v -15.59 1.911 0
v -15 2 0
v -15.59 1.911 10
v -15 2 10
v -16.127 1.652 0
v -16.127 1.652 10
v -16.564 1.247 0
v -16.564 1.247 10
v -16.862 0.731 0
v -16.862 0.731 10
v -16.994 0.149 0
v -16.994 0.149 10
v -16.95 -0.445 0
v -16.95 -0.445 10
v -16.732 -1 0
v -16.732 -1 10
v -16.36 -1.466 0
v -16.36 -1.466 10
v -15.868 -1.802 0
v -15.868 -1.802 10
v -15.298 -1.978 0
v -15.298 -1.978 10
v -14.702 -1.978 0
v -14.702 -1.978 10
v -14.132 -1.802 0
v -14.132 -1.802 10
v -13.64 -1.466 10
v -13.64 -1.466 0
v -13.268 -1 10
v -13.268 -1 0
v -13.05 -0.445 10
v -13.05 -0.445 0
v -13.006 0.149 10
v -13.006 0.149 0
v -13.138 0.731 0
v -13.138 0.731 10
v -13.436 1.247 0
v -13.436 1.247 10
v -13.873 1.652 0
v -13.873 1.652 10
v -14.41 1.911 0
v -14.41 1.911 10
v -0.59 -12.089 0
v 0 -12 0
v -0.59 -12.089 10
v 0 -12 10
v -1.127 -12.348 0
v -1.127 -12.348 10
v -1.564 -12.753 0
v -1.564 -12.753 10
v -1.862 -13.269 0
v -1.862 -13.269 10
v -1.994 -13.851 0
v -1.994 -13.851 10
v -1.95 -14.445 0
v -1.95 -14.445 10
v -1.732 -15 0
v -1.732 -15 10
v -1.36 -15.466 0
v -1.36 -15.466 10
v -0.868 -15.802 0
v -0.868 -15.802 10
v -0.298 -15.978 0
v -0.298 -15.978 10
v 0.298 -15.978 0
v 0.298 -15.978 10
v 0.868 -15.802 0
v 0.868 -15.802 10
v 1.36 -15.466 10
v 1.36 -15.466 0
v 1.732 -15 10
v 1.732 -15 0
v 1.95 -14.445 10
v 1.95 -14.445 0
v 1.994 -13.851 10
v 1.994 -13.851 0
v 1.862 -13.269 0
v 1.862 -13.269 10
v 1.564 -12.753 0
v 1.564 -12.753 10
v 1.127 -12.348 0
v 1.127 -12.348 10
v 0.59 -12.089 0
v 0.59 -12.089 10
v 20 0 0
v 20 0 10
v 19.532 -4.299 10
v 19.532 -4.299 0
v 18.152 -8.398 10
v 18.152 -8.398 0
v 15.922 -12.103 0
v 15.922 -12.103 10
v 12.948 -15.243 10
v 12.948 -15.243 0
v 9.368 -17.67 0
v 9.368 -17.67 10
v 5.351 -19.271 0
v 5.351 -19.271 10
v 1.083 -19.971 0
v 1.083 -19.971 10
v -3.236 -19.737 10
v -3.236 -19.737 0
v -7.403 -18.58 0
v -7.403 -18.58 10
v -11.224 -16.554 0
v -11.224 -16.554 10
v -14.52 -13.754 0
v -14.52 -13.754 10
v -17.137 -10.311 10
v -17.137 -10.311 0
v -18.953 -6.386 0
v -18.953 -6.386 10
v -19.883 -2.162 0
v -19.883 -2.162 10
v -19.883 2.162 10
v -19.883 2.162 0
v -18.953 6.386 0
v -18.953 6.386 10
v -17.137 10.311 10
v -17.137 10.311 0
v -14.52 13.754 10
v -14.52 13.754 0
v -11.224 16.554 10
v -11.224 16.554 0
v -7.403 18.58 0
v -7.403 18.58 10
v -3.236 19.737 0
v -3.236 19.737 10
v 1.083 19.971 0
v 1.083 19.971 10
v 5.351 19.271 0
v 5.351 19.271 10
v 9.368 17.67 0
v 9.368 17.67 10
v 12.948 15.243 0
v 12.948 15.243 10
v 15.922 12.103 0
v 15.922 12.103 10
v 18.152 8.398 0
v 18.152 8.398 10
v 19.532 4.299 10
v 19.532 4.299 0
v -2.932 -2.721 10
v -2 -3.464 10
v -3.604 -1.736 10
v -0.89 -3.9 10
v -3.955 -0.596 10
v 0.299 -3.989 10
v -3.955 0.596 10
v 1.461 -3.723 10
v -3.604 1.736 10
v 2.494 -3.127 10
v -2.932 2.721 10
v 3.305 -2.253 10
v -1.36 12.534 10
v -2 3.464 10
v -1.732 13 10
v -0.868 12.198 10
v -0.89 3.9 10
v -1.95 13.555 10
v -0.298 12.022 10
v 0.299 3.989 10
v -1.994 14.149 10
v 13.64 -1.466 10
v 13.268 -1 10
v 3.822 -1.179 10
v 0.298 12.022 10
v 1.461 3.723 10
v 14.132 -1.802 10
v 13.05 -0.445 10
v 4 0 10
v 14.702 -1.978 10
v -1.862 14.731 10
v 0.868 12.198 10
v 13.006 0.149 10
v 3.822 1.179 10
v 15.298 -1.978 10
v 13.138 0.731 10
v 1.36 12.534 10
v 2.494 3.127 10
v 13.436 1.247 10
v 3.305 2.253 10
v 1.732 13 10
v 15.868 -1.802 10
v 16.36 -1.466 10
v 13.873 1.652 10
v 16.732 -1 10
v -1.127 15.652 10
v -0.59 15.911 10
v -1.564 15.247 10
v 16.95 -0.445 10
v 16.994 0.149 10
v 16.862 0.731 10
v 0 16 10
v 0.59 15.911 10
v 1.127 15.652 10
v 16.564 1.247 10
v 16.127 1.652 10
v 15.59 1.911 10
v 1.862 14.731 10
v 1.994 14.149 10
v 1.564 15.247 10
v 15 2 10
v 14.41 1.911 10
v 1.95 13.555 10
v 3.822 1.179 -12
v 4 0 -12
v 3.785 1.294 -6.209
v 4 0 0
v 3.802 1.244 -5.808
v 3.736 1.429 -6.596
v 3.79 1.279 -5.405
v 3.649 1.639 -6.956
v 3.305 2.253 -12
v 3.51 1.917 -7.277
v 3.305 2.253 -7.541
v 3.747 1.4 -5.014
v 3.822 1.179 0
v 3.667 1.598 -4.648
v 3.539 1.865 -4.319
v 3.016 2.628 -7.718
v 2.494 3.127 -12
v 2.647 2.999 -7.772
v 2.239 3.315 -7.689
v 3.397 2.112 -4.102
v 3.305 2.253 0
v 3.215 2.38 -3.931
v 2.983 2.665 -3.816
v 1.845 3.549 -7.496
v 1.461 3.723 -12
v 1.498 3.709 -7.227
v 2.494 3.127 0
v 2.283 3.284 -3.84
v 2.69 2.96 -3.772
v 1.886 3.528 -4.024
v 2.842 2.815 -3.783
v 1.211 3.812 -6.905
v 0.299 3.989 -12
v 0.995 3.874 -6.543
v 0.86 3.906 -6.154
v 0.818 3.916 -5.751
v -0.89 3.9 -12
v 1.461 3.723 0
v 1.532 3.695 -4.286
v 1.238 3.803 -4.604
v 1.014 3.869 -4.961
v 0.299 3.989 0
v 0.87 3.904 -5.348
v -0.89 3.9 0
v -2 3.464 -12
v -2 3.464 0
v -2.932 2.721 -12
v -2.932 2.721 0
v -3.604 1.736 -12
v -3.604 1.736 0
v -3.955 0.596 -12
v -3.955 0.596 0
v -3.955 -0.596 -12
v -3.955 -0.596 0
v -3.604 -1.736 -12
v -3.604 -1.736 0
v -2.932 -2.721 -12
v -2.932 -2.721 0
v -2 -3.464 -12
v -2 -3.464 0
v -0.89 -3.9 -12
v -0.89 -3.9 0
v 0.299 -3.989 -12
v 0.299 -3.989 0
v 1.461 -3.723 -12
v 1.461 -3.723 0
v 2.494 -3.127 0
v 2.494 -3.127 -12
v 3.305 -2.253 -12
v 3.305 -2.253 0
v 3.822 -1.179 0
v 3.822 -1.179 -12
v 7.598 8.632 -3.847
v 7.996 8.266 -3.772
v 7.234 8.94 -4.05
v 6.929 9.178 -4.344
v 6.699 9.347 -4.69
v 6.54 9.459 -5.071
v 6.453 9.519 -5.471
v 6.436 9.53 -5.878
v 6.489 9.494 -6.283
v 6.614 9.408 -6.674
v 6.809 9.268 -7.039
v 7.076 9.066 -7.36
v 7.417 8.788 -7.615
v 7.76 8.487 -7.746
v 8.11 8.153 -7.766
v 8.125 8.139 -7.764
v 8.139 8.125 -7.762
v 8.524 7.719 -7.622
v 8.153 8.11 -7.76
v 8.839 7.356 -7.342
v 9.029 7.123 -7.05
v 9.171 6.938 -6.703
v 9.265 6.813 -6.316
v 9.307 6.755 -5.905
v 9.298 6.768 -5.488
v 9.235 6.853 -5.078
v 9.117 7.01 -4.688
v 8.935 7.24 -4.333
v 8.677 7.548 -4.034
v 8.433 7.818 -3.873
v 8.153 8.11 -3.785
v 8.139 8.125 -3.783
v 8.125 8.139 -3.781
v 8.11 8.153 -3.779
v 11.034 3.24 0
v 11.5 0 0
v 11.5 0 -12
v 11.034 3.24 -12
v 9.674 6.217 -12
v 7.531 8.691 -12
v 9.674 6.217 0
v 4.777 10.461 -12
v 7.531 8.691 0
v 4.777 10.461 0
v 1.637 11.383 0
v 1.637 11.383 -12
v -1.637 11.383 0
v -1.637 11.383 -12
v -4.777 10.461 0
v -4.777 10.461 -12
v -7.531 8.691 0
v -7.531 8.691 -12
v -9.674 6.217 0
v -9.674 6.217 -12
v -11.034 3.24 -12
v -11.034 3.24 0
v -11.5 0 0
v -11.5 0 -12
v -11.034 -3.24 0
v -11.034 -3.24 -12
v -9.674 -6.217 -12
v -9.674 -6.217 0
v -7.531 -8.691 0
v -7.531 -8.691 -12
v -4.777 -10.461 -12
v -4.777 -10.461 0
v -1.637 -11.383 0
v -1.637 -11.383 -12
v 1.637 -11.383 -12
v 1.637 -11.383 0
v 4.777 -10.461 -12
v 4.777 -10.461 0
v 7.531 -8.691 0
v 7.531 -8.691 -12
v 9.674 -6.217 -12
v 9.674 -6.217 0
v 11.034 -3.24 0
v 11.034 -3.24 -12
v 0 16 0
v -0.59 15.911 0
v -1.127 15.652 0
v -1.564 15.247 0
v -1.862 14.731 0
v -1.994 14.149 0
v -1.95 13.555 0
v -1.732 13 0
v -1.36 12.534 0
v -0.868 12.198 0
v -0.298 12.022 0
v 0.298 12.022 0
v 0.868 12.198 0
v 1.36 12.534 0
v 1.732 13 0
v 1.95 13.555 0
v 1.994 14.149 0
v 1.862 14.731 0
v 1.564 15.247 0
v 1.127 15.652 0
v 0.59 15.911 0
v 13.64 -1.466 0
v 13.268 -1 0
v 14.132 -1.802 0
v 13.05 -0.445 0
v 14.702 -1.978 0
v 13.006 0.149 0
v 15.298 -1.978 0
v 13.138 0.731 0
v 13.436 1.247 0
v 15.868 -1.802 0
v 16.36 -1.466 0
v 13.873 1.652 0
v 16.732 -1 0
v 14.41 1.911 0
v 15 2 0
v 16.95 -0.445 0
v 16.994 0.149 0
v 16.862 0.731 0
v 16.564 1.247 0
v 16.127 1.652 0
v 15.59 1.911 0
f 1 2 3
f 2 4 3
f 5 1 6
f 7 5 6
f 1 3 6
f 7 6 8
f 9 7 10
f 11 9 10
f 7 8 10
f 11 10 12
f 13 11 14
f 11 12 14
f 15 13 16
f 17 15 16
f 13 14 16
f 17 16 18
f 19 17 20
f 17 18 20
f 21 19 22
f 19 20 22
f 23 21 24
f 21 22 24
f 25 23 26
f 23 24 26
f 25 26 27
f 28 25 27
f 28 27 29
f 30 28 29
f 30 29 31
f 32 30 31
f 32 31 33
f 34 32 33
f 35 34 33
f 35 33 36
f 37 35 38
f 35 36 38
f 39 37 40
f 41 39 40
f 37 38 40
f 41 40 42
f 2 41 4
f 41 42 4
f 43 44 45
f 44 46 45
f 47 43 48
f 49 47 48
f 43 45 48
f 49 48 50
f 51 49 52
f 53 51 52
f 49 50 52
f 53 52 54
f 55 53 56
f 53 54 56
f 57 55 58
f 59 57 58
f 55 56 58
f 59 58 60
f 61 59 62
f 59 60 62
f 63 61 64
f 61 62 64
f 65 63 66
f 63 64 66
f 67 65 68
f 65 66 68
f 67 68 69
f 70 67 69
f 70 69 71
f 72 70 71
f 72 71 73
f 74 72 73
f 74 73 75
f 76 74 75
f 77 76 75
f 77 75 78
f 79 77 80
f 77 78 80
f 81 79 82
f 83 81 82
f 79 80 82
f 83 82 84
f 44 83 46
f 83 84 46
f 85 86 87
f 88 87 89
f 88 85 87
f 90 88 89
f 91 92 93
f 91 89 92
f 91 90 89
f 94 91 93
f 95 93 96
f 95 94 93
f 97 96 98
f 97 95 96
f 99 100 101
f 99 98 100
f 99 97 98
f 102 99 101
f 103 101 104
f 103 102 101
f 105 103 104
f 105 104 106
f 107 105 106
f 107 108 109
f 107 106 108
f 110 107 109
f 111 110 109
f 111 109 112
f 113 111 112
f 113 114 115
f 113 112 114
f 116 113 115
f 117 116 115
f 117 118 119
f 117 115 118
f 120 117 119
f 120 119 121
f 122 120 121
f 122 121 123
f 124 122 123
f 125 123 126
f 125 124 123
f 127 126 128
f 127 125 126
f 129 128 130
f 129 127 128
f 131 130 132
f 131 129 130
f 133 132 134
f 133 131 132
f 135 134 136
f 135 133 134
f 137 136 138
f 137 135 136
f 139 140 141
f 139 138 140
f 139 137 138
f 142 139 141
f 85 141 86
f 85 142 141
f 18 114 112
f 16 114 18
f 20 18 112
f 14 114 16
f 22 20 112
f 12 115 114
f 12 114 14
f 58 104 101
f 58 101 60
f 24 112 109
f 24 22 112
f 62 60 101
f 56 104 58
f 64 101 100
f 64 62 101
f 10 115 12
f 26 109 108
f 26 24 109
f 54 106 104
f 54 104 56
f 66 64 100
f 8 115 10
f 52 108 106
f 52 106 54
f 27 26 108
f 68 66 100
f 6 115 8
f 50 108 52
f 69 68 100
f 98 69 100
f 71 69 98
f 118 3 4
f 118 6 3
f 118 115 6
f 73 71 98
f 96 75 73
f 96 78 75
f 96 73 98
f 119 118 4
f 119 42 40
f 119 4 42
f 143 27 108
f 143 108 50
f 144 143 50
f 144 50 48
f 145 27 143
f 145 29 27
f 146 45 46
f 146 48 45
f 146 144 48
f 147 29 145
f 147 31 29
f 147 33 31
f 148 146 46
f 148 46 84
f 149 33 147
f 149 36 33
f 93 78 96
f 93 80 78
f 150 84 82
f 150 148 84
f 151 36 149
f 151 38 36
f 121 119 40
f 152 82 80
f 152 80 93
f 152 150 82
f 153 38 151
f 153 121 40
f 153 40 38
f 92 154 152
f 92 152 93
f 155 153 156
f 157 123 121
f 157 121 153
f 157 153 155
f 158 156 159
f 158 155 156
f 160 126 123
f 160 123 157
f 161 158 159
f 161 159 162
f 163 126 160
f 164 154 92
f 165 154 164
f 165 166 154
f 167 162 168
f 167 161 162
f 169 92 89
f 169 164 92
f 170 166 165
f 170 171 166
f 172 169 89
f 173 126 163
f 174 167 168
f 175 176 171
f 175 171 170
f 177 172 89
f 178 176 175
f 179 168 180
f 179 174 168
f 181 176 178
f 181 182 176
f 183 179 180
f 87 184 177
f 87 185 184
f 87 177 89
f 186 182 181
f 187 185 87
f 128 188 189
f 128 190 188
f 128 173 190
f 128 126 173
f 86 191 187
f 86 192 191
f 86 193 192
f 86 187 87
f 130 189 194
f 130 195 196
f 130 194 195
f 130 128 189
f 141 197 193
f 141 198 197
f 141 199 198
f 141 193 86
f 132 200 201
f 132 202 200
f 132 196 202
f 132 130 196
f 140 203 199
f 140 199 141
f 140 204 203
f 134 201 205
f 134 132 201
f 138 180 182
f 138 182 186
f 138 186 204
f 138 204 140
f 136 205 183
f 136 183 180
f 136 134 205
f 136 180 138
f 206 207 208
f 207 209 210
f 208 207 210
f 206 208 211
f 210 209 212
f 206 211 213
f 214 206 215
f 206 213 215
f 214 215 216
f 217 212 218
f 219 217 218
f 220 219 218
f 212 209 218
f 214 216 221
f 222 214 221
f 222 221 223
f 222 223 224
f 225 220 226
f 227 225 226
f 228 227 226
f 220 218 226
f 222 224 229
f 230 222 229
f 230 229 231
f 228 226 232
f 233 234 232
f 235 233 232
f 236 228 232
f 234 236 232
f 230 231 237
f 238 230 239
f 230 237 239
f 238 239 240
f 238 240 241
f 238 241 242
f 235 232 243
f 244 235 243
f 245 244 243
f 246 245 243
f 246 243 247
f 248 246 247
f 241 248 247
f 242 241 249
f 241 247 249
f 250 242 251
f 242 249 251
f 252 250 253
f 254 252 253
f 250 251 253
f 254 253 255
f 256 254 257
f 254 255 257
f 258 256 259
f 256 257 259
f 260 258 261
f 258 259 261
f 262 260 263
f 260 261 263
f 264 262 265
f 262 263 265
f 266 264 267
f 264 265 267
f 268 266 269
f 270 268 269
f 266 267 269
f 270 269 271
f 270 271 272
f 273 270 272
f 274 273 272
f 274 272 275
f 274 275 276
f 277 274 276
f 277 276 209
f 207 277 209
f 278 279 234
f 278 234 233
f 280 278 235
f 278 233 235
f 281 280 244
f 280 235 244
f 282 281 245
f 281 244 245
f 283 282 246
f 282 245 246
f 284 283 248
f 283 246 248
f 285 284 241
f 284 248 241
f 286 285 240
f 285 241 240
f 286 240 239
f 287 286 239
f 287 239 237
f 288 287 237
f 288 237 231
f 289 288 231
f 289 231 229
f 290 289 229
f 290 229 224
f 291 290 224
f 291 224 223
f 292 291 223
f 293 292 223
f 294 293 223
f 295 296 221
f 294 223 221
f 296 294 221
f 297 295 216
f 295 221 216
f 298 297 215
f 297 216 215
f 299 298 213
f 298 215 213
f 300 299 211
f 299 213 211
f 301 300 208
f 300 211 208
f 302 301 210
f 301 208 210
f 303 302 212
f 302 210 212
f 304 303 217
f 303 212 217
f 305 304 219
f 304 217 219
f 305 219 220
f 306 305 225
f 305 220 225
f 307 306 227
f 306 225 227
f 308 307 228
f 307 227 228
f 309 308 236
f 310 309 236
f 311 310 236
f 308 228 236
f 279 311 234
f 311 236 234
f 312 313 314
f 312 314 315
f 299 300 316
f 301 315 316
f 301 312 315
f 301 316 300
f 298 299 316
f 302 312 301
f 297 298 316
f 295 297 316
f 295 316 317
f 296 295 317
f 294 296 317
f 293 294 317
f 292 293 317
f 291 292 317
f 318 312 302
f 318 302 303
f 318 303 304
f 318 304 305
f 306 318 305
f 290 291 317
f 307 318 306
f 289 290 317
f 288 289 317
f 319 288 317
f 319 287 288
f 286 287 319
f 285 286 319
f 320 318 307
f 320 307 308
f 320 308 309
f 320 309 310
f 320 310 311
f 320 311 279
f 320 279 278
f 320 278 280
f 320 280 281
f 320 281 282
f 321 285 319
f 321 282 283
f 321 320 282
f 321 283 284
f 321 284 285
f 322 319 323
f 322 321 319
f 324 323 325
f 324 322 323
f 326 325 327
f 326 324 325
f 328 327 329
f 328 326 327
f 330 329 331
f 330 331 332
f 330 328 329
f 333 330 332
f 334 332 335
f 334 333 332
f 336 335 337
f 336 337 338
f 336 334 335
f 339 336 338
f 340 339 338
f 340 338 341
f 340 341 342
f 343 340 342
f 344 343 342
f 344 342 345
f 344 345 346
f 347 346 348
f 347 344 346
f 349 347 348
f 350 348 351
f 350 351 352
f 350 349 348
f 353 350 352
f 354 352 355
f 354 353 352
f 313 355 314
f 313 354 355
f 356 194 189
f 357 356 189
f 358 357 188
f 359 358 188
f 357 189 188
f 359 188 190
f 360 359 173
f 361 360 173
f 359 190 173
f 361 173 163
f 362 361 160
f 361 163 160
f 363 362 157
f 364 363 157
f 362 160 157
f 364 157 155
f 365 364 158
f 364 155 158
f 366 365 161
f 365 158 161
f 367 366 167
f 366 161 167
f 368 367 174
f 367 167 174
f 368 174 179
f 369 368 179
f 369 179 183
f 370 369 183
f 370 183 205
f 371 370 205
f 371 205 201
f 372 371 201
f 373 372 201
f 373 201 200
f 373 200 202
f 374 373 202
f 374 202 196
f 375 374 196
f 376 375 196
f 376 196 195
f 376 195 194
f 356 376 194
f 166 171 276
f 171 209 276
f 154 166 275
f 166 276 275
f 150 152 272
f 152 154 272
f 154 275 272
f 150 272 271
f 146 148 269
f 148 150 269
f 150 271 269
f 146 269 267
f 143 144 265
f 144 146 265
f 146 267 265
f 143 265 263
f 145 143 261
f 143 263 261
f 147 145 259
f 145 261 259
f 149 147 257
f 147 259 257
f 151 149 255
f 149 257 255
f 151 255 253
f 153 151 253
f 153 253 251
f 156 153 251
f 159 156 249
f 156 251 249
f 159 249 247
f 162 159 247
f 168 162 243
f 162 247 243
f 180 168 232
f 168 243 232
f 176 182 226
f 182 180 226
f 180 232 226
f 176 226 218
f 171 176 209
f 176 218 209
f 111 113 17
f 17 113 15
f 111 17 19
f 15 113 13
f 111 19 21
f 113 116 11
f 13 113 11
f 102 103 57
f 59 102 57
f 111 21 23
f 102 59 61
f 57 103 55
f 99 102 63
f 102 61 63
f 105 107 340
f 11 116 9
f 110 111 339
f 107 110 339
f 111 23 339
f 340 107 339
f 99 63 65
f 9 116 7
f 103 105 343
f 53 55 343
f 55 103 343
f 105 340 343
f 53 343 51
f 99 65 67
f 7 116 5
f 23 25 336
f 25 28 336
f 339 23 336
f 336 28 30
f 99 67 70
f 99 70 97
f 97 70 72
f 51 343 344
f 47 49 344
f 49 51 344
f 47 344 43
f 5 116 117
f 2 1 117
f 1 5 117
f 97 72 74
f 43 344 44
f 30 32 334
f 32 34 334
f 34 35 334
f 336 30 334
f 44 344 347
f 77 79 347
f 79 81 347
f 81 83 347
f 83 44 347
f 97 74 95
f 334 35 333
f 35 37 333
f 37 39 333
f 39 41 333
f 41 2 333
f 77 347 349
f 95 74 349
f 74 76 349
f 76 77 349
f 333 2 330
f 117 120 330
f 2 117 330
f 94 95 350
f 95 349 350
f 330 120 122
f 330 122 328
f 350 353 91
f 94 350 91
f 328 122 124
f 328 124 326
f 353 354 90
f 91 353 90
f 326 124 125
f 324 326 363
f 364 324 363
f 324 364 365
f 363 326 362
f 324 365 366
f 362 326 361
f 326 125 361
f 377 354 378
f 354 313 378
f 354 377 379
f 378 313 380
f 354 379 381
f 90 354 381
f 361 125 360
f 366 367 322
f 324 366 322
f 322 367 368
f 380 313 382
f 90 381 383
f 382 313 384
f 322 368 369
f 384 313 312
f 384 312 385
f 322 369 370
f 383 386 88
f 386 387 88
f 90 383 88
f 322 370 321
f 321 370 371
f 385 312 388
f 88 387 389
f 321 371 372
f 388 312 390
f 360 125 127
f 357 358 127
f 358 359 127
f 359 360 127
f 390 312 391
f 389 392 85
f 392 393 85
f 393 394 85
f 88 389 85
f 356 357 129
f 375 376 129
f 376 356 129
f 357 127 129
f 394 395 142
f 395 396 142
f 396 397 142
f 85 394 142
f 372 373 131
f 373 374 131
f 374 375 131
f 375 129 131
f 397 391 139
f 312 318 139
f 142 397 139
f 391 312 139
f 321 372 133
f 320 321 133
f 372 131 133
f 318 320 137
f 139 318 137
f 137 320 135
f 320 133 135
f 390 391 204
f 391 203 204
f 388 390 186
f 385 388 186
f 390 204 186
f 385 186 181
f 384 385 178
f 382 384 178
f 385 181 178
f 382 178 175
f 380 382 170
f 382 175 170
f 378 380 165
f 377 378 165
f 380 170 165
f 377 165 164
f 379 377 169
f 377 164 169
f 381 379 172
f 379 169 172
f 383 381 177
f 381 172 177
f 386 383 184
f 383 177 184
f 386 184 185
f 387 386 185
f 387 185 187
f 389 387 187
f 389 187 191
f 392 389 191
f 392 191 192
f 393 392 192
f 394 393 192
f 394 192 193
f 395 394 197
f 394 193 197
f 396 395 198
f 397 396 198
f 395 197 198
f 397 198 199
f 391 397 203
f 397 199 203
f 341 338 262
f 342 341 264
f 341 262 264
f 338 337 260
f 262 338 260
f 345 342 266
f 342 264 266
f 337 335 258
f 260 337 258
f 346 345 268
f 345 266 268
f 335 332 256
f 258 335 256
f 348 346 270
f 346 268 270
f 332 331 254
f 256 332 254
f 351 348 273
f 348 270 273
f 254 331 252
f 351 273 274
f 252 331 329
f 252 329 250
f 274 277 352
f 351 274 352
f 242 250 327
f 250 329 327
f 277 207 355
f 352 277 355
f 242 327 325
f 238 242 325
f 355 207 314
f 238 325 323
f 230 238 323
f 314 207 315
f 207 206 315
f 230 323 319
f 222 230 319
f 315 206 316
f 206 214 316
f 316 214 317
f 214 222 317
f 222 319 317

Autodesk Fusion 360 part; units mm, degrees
sketch "Sketch1" plane through (0, 0, 0) normal (0, 0, 1) x (1, 0, 0)
  circle A0 centre (0, 0) radius 20
  circle A1 centre (0, 0) radius 4
  circle A2 centre (0, 0) radius 11.5
  point P0 (-15, 0)
  point P1 (15, 0)
  point P2 (0, 14)
  point P3 (0, -14)
  dimension "d1" = 40
  dimension "d2" = 8
  dimension "d3" = 15
  dimension "d4" = 15
  dimension "d5" = 14
  dimension "d6" = 14
  dimension "d7" = 23
extrude "Extrude1" add sketch "Sketch1" along normal blind 10 contours A0 | A2
extrude "Extrude2" add sketch "Sketch1" against normal blind 12 contours A2
hole "Hole1" at (0, 14, 0) at (15, 0, 0) at (0, -14, 0) at (-15, 0, 0) direction (0, 0, 1) diameter 4 depth 20 tip angle 118
ref_plane "WorkPlane1" through (8.1317, 8.1317, -4.9786) normal (0.7071, 0.7071, 0) x (-0.7071, 0.7071, 0)
hole "Hole2" at (7.9968, 8.2666, -5.7724) direction (-0.7071, -0.7071, 0) diameter 4 depth 12 tip angle 118
